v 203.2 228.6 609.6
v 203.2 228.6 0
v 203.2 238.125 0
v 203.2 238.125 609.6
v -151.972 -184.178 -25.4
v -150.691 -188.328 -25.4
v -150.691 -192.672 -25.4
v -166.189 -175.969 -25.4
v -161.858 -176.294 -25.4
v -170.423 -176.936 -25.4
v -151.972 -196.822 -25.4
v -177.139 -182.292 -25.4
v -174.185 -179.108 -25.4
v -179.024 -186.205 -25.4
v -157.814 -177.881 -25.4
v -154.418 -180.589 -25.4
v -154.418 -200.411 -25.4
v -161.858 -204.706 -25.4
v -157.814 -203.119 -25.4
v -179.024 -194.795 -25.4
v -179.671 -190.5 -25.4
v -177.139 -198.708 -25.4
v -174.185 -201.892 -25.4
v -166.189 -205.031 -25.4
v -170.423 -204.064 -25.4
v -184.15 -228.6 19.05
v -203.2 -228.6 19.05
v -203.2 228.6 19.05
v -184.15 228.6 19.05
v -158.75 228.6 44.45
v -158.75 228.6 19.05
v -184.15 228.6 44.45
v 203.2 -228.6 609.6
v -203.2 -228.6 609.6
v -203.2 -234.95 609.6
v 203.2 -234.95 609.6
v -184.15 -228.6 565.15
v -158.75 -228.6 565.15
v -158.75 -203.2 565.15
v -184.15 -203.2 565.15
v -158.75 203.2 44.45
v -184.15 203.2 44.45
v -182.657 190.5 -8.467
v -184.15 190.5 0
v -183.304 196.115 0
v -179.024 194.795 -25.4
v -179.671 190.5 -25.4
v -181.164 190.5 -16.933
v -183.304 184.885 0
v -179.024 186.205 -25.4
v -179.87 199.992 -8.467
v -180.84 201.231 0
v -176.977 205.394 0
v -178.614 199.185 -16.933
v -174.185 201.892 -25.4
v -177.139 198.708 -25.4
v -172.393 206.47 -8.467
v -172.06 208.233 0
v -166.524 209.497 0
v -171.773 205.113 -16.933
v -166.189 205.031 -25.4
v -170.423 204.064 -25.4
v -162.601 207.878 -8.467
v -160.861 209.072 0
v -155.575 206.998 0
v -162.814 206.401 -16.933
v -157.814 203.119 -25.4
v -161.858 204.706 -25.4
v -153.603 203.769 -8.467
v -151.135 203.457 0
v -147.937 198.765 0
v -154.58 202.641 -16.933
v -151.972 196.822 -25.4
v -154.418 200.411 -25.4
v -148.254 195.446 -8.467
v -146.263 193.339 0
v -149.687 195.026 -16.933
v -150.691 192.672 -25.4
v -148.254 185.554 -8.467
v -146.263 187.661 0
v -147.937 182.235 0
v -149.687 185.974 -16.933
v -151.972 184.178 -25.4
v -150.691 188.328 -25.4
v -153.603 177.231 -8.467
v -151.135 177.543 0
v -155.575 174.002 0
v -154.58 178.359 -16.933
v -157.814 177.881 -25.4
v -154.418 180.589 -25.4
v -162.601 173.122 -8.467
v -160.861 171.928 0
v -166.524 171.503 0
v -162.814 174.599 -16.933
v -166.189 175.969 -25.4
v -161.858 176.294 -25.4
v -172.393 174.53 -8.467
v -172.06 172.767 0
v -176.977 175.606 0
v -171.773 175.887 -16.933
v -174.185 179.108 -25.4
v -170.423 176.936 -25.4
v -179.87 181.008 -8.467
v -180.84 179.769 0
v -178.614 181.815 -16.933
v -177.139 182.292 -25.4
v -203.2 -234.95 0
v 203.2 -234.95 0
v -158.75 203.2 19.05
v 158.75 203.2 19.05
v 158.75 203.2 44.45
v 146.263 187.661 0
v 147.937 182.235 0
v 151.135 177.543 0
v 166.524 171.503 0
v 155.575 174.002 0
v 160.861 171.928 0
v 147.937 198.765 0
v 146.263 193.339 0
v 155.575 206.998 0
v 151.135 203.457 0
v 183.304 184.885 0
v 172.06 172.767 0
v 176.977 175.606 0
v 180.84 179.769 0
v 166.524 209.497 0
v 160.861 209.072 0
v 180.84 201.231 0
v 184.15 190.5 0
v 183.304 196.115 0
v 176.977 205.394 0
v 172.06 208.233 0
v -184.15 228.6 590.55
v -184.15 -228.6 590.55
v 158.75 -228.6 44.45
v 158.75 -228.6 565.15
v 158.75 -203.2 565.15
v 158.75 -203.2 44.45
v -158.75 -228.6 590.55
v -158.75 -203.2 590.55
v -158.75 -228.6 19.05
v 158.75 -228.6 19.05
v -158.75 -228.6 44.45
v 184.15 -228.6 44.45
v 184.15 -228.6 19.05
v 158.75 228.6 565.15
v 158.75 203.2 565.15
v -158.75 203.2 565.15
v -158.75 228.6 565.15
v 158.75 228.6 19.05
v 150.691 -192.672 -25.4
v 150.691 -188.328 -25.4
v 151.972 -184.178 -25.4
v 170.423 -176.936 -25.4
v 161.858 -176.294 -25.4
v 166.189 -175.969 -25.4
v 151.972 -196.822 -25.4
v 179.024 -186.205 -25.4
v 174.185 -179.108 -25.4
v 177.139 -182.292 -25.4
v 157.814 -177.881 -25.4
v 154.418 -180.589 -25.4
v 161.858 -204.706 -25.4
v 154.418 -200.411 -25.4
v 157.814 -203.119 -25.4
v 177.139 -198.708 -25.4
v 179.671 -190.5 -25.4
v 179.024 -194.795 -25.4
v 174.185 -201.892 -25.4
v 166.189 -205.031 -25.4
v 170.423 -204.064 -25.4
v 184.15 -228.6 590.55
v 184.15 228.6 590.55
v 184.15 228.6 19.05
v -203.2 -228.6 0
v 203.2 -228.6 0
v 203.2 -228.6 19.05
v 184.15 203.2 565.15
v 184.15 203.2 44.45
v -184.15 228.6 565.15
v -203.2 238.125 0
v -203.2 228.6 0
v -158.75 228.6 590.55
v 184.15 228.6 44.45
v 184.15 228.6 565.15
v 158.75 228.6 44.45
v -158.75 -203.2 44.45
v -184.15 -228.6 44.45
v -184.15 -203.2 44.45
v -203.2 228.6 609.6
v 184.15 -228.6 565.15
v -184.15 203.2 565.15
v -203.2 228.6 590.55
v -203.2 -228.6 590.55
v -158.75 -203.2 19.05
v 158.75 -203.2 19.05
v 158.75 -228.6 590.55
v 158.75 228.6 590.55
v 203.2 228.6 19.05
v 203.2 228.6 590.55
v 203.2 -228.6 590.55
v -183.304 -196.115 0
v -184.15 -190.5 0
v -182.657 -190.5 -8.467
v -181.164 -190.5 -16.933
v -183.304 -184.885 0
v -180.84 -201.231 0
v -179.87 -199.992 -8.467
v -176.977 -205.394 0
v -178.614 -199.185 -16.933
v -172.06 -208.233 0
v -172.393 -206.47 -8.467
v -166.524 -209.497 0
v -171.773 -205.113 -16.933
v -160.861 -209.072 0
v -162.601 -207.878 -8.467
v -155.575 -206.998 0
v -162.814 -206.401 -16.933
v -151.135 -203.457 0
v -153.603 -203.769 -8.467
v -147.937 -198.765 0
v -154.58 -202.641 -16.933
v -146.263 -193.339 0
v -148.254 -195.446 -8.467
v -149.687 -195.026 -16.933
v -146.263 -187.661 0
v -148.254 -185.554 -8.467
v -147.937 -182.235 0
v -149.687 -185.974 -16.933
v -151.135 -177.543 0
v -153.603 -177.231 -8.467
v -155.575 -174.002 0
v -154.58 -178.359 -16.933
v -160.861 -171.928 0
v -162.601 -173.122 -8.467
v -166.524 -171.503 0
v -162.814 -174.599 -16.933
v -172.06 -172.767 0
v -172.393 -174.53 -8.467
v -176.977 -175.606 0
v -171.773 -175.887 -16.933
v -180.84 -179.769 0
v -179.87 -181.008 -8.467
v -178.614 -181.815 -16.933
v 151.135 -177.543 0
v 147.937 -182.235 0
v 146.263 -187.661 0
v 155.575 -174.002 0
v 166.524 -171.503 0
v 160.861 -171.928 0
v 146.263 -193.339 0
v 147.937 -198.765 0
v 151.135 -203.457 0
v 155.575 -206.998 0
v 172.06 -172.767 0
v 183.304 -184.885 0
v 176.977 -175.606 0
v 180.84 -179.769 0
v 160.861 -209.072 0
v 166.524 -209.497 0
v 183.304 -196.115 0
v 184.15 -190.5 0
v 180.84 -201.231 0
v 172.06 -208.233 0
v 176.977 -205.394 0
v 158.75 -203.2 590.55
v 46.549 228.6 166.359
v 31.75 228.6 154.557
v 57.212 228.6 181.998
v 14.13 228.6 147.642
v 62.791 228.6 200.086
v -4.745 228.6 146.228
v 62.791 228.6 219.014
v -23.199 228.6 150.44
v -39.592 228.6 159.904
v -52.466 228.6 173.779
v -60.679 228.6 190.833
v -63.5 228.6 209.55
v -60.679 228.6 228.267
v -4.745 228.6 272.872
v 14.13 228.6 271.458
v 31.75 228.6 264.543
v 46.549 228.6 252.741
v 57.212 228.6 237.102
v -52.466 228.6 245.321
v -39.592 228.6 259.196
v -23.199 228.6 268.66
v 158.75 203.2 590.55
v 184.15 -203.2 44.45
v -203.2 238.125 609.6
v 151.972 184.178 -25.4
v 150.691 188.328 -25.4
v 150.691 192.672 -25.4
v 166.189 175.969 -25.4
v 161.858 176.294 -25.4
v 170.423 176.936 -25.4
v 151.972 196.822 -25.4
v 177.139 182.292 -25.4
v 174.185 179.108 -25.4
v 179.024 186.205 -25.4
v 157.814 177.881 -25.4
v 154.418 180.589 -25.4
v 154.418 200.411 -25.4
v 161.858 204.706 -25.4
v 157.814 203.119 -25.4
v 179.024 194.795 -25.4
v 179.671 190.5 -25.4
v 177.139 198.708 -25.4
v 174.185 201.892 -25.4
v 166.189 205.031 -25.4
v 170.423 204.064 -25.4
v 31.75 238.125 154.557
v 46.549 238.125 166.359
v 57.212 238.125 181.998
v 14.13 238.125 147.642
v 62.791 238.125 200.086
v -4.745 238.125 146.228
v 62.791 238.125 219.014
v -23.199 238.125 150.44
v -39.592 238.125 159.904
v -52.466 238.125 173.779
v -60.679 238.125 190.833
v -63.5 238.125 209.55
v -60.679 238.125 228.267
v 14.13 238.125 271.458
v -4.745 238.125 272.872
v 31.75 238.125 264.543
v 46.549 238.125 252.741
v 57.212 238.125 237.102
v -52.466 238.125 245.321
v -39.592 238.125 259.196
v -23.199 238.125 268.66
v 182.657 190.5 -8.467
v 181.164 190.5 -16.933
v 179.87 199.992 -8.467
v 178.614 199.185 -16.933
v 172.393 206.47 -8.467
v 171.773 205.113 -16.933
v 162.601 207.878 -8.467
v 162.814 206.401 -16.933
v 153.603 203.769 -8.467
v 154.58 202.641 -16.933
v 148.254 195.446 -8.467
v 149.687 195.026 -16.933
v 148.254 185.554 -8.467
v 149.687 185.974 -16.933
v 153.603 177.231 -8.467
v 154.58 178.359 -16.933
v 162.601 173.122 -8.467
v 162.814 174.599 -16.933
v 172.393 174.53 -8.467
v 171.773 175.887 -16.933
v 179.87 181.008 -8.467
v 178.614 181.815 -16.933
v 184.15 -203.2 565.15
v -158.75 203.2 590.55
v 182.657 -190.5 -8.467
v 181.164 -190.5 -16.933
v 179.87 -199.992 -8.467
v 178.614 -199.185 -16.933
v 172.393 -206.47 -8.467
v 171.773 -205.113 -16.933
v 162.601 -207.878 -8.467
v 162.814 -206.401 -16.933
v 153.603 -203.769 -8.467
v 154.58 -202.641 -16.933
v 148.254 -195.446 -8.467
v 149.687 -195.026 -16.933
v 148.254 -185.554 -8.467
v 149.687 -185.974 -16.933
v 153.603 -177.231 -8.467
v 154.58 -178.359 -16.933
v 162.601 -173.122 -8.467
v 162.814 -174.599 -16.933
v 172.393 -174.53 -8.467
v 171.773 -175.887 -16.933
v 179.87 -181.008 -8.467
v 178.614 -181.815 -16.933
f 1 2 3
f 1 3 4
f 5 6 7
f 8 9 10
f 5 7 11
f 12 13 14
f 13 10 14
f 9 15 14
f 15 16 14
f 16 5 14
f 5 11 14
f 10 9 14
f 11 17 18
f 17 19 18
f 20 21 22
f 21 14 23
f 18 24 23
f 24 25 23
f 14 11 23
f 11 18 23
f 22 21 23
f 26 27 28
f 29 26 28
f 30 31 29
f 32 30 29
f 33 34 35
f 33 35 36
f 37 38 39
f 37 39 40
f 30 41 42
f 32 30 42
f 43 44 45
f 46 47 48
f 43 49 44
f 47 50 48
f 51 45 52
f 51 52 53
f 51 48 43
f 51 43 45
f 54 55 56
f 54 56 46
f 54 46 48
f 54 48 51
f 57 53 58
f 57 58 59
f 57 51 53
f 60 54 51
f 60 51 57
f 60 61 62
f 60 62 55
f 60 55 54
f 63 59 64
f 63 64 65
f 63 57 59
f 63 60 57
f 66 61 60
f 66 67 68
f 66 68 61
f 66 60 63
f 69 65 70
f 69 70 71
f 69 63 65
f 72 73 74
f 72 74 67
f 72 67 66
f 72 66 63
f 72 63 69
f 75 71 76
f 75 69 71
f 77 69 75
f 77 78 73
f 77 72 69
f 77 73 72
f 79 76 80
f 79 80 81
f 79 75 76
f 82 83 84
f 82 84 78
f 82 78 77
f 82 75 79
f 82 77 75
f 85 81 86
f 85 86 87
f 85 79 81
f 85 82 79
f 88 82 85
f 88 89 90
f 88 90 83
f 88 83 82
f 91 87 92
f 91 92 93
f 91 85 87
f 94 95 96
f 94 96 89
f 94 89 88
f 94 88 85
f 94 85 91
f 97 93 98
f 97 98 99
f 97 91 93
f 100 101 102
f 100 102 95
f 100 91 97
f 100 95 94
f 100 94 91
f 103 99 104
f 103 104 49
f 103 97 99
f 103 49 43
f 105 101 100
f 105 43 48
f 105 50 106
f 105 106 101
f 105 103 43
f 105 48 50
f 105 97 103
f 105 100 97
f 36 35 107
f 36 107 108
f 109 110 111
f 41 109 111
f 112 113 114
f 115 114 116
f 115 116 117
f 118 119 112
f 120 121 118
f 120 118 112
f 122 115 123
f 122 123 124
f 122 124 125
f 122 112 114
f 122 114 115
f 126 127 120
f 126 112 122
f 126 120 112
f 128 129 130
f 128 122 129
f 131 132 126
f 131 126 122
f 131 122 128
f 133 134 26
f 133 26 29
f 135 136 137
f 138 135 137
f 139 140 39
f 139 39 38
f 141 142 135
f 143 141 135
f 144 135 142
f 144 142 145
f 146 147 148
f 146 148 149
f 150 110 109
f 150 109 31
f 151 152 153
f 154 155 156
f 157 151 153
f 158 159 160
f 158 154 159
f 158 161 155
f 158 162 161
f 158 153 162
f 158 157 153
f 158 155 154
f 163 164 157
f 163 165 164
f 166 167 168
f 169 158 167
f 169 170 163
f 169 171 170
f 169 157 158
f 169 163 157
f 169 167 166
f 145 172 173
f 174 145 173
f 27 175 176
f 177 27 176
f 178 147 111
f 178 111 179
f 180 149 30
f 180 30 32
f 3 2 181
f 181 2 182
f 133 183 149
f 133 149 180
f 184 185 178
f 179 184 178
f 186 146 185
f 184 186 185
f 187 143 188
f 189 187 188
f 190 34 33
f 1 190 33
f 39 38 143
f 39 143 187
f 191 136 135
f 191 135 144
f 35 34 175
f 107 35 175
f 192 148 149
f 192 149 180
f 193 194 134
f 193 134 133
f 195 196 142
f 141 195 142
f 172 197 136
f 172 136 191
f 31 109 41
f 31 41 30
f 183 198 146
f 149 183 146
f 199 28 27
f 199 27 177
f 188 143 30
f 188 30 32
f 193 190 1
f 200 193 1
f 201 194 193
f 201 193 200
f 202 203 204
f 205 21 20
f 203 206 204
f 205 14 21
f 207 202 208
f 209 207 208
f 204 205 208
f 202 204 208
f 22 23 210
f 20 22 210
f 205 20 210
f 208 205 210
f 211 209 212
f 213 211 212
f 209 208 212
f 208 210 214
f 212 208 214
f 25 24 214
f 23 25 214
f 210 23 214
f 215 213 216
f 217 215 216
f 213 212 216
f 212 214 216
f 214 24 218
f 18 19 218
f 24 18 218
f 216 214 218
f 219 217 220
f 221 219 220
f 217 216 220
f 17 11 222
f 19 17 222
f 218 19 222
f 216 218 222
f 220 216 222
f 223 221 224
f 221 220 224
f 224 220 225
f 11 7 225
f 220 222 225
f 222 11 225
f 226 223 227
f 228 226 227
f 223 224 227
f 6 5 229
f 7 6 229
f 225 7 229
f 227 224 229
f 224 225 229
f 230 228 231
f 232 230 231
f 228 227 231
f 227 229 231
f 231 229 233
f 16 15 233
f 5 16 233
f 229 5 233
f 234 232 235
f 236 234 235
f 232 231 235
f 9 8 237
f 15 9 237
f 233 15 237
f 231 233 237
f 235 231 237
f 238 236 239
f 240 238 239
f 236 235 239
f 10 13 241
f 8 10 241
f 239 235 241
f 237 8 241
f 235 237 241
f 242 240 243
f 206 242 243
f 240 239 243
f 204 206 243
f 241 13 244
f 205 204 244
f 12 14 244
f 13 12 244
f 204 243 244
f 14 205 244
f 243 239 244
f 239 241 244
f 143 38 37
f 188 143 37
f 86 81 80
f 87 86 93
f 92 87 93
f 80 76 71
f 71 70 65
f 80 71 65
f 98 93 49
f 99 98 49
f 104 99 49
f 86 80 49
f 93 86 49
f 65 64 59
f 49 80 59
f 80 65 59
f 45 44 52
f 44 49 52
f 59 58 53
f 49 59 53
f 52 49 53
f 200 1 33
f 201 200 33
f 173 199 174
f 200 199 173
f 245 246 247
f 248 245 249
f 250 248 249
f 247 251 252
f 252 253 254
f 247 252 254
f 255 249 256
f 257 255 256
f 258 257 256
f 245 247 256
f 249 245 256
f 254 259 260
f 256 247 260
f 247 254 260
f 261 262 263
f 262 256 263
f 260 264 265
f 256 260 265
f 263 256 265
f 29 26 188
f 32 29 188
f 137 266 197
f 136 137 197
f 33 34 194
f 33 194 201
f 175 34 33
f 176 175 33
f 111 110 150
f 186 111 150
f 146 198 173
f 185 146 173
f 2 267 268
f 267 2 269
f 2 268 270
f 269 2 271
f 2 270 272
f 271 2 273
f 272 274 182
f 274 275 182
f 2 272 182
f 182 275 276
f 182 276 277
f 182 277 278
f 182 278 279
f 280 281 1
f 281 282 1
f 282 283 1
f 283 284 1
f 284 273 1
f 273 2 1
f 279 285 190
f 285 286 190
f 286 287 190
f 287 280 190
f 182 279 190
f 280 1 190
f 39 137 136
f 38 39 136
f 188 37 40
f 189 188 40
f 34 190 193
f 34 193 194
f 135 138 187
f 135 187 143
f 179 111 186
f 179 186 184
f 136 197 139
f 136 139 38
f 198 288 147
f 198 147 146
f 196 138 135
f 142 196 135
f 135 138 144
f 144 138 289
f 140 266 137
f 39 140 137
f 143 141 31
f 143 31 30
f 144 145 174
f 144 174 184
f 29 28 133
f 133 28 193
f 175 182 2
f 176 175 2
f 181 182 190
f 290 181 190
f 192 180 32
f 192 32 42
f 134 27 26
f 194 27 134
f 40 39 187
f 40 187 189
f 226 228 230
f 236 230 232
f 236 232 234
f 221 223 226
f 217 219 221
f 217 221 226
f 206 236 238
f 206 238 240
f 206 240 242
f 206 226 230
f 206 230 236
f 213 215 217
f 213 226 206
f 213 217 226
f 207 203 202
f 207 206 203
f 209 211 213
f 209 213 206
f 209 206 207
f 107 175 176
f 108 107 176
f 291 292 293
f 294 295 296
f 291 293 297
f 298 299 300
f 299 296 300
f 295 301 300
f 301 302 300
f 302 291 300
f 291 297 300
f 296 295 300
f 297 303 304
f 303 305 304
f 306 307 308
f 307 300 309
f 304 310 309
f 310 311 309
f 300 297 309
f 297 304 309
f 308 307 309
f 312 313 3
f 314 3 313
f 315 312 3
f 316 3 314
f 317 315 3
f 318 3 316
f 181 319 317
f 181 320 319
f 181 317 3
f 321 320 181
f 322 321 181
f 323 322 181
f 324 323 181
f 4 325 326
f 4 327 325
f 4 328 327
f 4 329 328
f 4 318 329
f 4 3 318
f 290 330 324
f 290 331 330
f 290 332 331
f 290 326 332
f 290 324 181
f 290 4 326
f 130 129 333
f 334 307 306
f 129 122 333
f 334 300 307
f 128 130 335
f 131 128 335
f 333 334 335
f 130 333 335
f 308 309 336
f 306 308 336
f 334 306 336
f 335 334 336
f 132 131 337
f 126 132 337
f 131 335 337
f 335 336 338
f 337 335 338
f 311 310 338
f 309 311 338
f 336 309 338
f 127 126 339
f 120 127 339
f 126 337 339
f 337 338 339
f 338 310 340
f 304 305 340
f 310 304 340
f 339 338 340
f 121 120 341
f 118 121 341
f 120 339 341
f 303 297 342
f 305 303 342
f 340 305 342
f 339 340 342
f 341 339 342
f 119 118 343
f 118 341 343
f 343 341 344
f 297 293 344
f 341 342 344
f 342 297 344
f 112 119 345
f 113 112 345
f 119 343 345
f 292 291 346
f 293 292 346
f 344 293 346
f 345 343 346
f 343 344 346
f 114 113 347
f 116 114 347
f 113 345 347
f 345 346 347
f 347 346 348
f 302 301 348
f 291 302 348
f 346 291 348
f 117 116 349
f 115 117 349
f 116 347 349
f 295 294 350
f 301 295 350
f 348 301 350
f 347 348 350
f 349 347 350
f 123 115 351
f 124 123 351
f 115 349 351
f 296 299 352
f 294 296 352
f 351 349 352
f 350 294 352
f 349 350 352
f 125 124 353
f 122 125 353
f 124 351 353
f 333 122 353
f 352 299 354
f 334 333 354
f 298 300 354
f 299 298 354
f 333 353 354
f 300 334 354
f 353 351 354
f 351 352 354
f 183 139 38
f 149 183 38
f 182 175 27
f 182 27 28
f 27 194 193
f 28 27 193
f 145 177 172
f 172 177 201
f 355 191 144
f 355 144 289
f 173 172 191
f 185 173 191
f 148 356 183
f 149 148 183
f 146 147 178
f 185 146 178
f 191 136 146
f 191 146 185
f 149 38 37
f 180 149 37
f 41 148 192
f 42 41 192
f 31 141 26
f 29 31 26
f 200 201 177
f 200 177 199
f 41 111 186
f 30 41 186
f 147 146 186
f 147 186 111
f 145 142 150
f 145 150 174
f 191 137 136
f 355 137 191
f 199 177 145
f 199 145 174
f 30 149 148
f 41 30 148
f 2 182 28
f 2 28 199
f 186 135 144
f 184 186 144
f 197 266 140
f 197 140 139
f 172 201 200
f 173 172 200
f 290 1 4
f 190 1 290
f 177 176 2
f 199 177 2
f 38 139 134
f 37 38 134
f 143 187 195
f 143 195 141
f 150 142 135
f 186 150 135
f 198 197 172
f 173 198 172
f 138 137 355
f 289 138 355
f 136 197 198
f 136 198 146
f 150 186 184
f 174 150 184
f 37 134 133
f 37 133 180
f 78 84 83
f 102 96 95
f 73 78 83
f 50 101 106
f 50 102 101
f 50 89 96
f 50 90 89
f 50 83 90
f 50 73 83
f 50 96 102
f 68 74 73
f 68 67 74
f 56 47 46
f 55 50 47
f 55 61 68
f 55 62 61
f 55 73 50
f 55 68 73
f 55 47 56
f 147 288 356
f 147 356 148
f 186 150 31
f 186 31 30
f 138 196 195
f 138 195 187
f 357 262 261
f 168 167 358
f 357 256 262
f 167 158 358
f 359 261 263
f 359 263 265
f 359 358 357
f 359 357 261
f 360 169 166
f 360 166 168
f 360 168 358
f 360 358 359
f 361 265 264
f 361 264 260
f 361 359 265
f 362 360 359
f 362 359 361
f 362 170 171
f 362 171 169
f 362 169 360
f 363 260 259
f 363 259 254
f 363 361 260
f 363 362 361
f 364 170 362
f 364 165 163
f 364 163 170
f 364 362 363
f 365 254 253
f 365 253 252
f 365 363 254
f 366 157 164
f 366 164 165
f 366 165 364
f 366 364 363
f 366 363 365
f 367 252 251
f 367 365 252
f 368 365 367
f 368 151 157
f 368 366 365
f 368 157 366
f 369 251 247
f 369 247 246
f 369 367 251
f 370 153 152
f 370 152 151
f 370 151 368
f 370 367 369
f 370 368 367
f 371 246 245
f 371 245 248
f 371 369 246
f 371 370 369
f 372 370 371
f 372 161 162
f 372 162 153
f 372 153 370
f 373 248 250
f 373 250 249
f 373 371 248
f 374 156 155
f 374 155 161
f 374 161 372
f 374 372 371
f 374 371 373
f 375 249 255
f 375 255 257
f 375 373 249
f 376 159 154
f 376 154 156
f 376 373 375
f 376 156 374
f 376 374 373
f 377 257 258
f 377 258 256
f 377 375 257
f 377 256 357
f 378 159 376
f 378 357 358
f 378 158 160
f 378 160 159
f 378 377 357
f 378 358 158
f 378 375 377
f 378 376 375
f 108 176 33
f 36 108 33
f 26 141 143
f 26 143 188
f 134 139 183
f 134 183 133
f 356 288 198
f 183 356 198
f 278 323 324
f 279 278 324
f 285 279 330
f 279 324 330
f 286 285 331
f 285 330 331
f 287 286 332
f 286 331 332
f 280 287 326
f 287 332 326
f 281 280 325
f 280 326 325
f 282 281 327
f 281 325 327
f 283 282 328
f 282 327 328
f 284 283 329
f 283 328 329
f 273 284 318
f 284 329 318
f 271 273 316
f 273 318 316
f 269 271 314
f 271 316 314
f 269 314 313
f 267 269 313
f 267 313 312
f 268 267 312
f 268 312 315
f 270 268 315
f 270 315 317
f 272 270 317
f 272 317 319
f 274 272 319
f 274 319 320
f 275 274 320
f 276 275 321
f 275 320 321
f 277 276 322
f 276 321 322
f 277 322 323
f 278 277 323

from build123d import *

# Parameters (mm, degrees)
F0_W      = 406.4
F0_H      = 457.2
F1_DEPTH  = 19.05
F3_W      = 406.4
F3_H      = 457.2
F4_DEPTH  = 19.05
F5_W      = 457.2
F5_H      = 571.5
F6_DEPTH  = 19.05
F8_W      = 25.4
F8_H      = 25.4
F9_DEPTH  = 457.2
F11_W     = 25.4
F11_H     = 25.4
F12_DEPTH = 317.5
F16_W     = 25.4
F16_H     = 25.4
F17_DEPTH = 520.7
F20_W     = 406.4
F20_H     = 609.6
F21_DEPTH = 9.525
F22_R     = 63.5
F23_DEPTH = 9.525
F24_W     = 406.4
F24_H     = 590.55
F24_H_2   = 19.05
F25_DEPTH = 6.35
F26_R     = 19.05
F27_DEPTH = 25.4
F27_TAPER = 10


with BuildPart() as f1:
    # F0 (on Top) → F1 (new body)
    with BuildSketch(Plane.XY):
        Rectangle(F0_W, F0_H)
    extrude(amount=F1_DEPTH)


with BuildPart() as f4:
    # F3 (on offset) → F4 (new body)
    with BuildSketch(Plane(origin=(0, 0, 609.6), x_dir=(1, 0, 0), z_dir=(0, 0, -1))):
        Rectangle(F3_W, F3_H)
    extrude(amount=F4_DEPTH)


with BuildPart() as f6:
    # F5 (on face) → F6 (new body)
    with BuildSketch(Plane.YZ.offset(203.2)):
        with Locations((0, 304.8)):
            Rectangle(F5_W, F5_H)
    extrude(amount=-F6_DEPTH)


with BuildPart() as f7_1:
    # F7: instance of F6
    add(f6.part.mirror(Plane.YZ))


with BuildPart() as f9:
    # F8 (on face) → F9 (new body, through all)
    with BuildSketch(Plane.XZ.offset(228.6)):
        with Locations((171.45, 31.75)):
            Rectangle(F8_W, F8_H)
    extrude(amount=-F9_DEPTH)


with BuildPart() as f10_1:
    # F10: instance of F9
    add(f9.part.mirror(Plane.YZ))


with BuildPart() as f12:
    # F11 (on face) → F12 (new body, through all)
    with BuildSketch(Plane(origin=(158.75, 0, 0), x_dir=(0, -1, 0), z_dir=(-1, 0, 0))):
        with Locations((215.9, 31.75)):
            Rectangle(F11_W, F11_H)
    extrude(amount=F12_DEPTH)


with BuildPart() as f13_1:
    # F13: instance of F12
    add(f12.part.mirror(Plane.XZ))


with BuildPart() as f15_1:
    # F15: instance of F10_1
    add(f10_1.part.mirror(Plane.XY.offset(304.8)))


with BuildPart() as f15_2:
    # F15: instance of F13_1
    add(f13_1.part.mirror(Plane.XY.offset(304.8)))


with BuildPart() as f15_3:
    # F15: instance of F9
    add(f9.part.mirror(Plane.XY.offset(304.8)))


with BuildPart() as f15_4:
    # F15: instance of F12
    add(f12.part.mirror(Plane.XY.offset(304.8)))


with BuildPart() as f17:
    # F16 (on face) → F17 (new body, through all)
    with BuildSketch(Plane.XY.offset(44.45)):
        with Locations((171.45, -215.9)):
            Rectangle(F16_W, F16_H)
    extrude(amount=F17_DEPTH)


with BuildPart() as f18_1:
    # F18: instance of F17
    add(f17.part.mirror(Plane.XZ))


with BuildPart() as f19_1:
    # F19: instance of F17
    add(f17.part.mirror(Plane.YZ))


with BuildPart() as f19_2:
    # F19: instance of F18_1
    add(f18_1.part.mirror(Plane.YZ))


with BuildPart() as f21:
    # F20 (on face) → F21 (new body)
    with BuildSketch(Plane(origin=(0, 228.6, 0), x_dir=(-1, 0, 0), z_dir=(0, 1, 0))):
        with Locations((0, 304.8)):
            Rectangle(F20_W, F20_H)
    extrude(amount=F21_DEPTH)

    # F22 (on face) → F23 (cut, through all)
    with BuildSketch(Plane(origin=(0, 238.125, 0), x_dir=(-1, 0, 0), z_dir=(0, 1, 0))):
        with Locations((0, 209.55)):
            Circle(F22_R)
    extrude(amount=-F23_DEPTH, mode=Mode.SUBTRACT)


with BuildPart() as f25:
    # F24 (on face) → F25 (new body)
    with BuildSketch(Plane.XZ.offset(228.6)):
        with Locations((0, 314.325)):
            Rectangle(F24_W, F24_H)
        with Locations((0, 9.525)):
            Rectangle(F24_W, F24_H_2)
    extrude(amount=F25_DEPTH)


with BuildPart() as f27:
    # F26 (on face) → F27 (new body)
    with BuildSketch(Plane(origin=(0, 0, 0), x_dir=(1, 0, 0), z_dir=(0, 0, -1))):
        with Locations((165.1, 190.5)):
            Circle(F26_R)
    extrude(amount=F27_DEPTH, taper=F27_TAPER)


with BuildPart() as f28_1:
    # F28: instance of F27
    add(f27.part.mirror(Plane.XZ))


with BuildPart() as f29_1:
    # F29: instance of F27
    add(f27.part.mirror(Plane.YZ))


with BuildPart() as f29_2:
    # F29: instance of F28_1
    add(f28_1.part.mirror(Plane.YZ))


solid = Compound([f1.part, f4.part, f6.part, f7_1.part, f9.part, f10_1.part, f12.part, f13_1.part, f15_1.part, f15_2.part, f15_3.part, f15_4.part, f17.part, f18_1.part, f19_1.part, f19_2.part, f21.part, f25.part, f27.part, f28_1.part, f29_1.part, f29_2.part])
